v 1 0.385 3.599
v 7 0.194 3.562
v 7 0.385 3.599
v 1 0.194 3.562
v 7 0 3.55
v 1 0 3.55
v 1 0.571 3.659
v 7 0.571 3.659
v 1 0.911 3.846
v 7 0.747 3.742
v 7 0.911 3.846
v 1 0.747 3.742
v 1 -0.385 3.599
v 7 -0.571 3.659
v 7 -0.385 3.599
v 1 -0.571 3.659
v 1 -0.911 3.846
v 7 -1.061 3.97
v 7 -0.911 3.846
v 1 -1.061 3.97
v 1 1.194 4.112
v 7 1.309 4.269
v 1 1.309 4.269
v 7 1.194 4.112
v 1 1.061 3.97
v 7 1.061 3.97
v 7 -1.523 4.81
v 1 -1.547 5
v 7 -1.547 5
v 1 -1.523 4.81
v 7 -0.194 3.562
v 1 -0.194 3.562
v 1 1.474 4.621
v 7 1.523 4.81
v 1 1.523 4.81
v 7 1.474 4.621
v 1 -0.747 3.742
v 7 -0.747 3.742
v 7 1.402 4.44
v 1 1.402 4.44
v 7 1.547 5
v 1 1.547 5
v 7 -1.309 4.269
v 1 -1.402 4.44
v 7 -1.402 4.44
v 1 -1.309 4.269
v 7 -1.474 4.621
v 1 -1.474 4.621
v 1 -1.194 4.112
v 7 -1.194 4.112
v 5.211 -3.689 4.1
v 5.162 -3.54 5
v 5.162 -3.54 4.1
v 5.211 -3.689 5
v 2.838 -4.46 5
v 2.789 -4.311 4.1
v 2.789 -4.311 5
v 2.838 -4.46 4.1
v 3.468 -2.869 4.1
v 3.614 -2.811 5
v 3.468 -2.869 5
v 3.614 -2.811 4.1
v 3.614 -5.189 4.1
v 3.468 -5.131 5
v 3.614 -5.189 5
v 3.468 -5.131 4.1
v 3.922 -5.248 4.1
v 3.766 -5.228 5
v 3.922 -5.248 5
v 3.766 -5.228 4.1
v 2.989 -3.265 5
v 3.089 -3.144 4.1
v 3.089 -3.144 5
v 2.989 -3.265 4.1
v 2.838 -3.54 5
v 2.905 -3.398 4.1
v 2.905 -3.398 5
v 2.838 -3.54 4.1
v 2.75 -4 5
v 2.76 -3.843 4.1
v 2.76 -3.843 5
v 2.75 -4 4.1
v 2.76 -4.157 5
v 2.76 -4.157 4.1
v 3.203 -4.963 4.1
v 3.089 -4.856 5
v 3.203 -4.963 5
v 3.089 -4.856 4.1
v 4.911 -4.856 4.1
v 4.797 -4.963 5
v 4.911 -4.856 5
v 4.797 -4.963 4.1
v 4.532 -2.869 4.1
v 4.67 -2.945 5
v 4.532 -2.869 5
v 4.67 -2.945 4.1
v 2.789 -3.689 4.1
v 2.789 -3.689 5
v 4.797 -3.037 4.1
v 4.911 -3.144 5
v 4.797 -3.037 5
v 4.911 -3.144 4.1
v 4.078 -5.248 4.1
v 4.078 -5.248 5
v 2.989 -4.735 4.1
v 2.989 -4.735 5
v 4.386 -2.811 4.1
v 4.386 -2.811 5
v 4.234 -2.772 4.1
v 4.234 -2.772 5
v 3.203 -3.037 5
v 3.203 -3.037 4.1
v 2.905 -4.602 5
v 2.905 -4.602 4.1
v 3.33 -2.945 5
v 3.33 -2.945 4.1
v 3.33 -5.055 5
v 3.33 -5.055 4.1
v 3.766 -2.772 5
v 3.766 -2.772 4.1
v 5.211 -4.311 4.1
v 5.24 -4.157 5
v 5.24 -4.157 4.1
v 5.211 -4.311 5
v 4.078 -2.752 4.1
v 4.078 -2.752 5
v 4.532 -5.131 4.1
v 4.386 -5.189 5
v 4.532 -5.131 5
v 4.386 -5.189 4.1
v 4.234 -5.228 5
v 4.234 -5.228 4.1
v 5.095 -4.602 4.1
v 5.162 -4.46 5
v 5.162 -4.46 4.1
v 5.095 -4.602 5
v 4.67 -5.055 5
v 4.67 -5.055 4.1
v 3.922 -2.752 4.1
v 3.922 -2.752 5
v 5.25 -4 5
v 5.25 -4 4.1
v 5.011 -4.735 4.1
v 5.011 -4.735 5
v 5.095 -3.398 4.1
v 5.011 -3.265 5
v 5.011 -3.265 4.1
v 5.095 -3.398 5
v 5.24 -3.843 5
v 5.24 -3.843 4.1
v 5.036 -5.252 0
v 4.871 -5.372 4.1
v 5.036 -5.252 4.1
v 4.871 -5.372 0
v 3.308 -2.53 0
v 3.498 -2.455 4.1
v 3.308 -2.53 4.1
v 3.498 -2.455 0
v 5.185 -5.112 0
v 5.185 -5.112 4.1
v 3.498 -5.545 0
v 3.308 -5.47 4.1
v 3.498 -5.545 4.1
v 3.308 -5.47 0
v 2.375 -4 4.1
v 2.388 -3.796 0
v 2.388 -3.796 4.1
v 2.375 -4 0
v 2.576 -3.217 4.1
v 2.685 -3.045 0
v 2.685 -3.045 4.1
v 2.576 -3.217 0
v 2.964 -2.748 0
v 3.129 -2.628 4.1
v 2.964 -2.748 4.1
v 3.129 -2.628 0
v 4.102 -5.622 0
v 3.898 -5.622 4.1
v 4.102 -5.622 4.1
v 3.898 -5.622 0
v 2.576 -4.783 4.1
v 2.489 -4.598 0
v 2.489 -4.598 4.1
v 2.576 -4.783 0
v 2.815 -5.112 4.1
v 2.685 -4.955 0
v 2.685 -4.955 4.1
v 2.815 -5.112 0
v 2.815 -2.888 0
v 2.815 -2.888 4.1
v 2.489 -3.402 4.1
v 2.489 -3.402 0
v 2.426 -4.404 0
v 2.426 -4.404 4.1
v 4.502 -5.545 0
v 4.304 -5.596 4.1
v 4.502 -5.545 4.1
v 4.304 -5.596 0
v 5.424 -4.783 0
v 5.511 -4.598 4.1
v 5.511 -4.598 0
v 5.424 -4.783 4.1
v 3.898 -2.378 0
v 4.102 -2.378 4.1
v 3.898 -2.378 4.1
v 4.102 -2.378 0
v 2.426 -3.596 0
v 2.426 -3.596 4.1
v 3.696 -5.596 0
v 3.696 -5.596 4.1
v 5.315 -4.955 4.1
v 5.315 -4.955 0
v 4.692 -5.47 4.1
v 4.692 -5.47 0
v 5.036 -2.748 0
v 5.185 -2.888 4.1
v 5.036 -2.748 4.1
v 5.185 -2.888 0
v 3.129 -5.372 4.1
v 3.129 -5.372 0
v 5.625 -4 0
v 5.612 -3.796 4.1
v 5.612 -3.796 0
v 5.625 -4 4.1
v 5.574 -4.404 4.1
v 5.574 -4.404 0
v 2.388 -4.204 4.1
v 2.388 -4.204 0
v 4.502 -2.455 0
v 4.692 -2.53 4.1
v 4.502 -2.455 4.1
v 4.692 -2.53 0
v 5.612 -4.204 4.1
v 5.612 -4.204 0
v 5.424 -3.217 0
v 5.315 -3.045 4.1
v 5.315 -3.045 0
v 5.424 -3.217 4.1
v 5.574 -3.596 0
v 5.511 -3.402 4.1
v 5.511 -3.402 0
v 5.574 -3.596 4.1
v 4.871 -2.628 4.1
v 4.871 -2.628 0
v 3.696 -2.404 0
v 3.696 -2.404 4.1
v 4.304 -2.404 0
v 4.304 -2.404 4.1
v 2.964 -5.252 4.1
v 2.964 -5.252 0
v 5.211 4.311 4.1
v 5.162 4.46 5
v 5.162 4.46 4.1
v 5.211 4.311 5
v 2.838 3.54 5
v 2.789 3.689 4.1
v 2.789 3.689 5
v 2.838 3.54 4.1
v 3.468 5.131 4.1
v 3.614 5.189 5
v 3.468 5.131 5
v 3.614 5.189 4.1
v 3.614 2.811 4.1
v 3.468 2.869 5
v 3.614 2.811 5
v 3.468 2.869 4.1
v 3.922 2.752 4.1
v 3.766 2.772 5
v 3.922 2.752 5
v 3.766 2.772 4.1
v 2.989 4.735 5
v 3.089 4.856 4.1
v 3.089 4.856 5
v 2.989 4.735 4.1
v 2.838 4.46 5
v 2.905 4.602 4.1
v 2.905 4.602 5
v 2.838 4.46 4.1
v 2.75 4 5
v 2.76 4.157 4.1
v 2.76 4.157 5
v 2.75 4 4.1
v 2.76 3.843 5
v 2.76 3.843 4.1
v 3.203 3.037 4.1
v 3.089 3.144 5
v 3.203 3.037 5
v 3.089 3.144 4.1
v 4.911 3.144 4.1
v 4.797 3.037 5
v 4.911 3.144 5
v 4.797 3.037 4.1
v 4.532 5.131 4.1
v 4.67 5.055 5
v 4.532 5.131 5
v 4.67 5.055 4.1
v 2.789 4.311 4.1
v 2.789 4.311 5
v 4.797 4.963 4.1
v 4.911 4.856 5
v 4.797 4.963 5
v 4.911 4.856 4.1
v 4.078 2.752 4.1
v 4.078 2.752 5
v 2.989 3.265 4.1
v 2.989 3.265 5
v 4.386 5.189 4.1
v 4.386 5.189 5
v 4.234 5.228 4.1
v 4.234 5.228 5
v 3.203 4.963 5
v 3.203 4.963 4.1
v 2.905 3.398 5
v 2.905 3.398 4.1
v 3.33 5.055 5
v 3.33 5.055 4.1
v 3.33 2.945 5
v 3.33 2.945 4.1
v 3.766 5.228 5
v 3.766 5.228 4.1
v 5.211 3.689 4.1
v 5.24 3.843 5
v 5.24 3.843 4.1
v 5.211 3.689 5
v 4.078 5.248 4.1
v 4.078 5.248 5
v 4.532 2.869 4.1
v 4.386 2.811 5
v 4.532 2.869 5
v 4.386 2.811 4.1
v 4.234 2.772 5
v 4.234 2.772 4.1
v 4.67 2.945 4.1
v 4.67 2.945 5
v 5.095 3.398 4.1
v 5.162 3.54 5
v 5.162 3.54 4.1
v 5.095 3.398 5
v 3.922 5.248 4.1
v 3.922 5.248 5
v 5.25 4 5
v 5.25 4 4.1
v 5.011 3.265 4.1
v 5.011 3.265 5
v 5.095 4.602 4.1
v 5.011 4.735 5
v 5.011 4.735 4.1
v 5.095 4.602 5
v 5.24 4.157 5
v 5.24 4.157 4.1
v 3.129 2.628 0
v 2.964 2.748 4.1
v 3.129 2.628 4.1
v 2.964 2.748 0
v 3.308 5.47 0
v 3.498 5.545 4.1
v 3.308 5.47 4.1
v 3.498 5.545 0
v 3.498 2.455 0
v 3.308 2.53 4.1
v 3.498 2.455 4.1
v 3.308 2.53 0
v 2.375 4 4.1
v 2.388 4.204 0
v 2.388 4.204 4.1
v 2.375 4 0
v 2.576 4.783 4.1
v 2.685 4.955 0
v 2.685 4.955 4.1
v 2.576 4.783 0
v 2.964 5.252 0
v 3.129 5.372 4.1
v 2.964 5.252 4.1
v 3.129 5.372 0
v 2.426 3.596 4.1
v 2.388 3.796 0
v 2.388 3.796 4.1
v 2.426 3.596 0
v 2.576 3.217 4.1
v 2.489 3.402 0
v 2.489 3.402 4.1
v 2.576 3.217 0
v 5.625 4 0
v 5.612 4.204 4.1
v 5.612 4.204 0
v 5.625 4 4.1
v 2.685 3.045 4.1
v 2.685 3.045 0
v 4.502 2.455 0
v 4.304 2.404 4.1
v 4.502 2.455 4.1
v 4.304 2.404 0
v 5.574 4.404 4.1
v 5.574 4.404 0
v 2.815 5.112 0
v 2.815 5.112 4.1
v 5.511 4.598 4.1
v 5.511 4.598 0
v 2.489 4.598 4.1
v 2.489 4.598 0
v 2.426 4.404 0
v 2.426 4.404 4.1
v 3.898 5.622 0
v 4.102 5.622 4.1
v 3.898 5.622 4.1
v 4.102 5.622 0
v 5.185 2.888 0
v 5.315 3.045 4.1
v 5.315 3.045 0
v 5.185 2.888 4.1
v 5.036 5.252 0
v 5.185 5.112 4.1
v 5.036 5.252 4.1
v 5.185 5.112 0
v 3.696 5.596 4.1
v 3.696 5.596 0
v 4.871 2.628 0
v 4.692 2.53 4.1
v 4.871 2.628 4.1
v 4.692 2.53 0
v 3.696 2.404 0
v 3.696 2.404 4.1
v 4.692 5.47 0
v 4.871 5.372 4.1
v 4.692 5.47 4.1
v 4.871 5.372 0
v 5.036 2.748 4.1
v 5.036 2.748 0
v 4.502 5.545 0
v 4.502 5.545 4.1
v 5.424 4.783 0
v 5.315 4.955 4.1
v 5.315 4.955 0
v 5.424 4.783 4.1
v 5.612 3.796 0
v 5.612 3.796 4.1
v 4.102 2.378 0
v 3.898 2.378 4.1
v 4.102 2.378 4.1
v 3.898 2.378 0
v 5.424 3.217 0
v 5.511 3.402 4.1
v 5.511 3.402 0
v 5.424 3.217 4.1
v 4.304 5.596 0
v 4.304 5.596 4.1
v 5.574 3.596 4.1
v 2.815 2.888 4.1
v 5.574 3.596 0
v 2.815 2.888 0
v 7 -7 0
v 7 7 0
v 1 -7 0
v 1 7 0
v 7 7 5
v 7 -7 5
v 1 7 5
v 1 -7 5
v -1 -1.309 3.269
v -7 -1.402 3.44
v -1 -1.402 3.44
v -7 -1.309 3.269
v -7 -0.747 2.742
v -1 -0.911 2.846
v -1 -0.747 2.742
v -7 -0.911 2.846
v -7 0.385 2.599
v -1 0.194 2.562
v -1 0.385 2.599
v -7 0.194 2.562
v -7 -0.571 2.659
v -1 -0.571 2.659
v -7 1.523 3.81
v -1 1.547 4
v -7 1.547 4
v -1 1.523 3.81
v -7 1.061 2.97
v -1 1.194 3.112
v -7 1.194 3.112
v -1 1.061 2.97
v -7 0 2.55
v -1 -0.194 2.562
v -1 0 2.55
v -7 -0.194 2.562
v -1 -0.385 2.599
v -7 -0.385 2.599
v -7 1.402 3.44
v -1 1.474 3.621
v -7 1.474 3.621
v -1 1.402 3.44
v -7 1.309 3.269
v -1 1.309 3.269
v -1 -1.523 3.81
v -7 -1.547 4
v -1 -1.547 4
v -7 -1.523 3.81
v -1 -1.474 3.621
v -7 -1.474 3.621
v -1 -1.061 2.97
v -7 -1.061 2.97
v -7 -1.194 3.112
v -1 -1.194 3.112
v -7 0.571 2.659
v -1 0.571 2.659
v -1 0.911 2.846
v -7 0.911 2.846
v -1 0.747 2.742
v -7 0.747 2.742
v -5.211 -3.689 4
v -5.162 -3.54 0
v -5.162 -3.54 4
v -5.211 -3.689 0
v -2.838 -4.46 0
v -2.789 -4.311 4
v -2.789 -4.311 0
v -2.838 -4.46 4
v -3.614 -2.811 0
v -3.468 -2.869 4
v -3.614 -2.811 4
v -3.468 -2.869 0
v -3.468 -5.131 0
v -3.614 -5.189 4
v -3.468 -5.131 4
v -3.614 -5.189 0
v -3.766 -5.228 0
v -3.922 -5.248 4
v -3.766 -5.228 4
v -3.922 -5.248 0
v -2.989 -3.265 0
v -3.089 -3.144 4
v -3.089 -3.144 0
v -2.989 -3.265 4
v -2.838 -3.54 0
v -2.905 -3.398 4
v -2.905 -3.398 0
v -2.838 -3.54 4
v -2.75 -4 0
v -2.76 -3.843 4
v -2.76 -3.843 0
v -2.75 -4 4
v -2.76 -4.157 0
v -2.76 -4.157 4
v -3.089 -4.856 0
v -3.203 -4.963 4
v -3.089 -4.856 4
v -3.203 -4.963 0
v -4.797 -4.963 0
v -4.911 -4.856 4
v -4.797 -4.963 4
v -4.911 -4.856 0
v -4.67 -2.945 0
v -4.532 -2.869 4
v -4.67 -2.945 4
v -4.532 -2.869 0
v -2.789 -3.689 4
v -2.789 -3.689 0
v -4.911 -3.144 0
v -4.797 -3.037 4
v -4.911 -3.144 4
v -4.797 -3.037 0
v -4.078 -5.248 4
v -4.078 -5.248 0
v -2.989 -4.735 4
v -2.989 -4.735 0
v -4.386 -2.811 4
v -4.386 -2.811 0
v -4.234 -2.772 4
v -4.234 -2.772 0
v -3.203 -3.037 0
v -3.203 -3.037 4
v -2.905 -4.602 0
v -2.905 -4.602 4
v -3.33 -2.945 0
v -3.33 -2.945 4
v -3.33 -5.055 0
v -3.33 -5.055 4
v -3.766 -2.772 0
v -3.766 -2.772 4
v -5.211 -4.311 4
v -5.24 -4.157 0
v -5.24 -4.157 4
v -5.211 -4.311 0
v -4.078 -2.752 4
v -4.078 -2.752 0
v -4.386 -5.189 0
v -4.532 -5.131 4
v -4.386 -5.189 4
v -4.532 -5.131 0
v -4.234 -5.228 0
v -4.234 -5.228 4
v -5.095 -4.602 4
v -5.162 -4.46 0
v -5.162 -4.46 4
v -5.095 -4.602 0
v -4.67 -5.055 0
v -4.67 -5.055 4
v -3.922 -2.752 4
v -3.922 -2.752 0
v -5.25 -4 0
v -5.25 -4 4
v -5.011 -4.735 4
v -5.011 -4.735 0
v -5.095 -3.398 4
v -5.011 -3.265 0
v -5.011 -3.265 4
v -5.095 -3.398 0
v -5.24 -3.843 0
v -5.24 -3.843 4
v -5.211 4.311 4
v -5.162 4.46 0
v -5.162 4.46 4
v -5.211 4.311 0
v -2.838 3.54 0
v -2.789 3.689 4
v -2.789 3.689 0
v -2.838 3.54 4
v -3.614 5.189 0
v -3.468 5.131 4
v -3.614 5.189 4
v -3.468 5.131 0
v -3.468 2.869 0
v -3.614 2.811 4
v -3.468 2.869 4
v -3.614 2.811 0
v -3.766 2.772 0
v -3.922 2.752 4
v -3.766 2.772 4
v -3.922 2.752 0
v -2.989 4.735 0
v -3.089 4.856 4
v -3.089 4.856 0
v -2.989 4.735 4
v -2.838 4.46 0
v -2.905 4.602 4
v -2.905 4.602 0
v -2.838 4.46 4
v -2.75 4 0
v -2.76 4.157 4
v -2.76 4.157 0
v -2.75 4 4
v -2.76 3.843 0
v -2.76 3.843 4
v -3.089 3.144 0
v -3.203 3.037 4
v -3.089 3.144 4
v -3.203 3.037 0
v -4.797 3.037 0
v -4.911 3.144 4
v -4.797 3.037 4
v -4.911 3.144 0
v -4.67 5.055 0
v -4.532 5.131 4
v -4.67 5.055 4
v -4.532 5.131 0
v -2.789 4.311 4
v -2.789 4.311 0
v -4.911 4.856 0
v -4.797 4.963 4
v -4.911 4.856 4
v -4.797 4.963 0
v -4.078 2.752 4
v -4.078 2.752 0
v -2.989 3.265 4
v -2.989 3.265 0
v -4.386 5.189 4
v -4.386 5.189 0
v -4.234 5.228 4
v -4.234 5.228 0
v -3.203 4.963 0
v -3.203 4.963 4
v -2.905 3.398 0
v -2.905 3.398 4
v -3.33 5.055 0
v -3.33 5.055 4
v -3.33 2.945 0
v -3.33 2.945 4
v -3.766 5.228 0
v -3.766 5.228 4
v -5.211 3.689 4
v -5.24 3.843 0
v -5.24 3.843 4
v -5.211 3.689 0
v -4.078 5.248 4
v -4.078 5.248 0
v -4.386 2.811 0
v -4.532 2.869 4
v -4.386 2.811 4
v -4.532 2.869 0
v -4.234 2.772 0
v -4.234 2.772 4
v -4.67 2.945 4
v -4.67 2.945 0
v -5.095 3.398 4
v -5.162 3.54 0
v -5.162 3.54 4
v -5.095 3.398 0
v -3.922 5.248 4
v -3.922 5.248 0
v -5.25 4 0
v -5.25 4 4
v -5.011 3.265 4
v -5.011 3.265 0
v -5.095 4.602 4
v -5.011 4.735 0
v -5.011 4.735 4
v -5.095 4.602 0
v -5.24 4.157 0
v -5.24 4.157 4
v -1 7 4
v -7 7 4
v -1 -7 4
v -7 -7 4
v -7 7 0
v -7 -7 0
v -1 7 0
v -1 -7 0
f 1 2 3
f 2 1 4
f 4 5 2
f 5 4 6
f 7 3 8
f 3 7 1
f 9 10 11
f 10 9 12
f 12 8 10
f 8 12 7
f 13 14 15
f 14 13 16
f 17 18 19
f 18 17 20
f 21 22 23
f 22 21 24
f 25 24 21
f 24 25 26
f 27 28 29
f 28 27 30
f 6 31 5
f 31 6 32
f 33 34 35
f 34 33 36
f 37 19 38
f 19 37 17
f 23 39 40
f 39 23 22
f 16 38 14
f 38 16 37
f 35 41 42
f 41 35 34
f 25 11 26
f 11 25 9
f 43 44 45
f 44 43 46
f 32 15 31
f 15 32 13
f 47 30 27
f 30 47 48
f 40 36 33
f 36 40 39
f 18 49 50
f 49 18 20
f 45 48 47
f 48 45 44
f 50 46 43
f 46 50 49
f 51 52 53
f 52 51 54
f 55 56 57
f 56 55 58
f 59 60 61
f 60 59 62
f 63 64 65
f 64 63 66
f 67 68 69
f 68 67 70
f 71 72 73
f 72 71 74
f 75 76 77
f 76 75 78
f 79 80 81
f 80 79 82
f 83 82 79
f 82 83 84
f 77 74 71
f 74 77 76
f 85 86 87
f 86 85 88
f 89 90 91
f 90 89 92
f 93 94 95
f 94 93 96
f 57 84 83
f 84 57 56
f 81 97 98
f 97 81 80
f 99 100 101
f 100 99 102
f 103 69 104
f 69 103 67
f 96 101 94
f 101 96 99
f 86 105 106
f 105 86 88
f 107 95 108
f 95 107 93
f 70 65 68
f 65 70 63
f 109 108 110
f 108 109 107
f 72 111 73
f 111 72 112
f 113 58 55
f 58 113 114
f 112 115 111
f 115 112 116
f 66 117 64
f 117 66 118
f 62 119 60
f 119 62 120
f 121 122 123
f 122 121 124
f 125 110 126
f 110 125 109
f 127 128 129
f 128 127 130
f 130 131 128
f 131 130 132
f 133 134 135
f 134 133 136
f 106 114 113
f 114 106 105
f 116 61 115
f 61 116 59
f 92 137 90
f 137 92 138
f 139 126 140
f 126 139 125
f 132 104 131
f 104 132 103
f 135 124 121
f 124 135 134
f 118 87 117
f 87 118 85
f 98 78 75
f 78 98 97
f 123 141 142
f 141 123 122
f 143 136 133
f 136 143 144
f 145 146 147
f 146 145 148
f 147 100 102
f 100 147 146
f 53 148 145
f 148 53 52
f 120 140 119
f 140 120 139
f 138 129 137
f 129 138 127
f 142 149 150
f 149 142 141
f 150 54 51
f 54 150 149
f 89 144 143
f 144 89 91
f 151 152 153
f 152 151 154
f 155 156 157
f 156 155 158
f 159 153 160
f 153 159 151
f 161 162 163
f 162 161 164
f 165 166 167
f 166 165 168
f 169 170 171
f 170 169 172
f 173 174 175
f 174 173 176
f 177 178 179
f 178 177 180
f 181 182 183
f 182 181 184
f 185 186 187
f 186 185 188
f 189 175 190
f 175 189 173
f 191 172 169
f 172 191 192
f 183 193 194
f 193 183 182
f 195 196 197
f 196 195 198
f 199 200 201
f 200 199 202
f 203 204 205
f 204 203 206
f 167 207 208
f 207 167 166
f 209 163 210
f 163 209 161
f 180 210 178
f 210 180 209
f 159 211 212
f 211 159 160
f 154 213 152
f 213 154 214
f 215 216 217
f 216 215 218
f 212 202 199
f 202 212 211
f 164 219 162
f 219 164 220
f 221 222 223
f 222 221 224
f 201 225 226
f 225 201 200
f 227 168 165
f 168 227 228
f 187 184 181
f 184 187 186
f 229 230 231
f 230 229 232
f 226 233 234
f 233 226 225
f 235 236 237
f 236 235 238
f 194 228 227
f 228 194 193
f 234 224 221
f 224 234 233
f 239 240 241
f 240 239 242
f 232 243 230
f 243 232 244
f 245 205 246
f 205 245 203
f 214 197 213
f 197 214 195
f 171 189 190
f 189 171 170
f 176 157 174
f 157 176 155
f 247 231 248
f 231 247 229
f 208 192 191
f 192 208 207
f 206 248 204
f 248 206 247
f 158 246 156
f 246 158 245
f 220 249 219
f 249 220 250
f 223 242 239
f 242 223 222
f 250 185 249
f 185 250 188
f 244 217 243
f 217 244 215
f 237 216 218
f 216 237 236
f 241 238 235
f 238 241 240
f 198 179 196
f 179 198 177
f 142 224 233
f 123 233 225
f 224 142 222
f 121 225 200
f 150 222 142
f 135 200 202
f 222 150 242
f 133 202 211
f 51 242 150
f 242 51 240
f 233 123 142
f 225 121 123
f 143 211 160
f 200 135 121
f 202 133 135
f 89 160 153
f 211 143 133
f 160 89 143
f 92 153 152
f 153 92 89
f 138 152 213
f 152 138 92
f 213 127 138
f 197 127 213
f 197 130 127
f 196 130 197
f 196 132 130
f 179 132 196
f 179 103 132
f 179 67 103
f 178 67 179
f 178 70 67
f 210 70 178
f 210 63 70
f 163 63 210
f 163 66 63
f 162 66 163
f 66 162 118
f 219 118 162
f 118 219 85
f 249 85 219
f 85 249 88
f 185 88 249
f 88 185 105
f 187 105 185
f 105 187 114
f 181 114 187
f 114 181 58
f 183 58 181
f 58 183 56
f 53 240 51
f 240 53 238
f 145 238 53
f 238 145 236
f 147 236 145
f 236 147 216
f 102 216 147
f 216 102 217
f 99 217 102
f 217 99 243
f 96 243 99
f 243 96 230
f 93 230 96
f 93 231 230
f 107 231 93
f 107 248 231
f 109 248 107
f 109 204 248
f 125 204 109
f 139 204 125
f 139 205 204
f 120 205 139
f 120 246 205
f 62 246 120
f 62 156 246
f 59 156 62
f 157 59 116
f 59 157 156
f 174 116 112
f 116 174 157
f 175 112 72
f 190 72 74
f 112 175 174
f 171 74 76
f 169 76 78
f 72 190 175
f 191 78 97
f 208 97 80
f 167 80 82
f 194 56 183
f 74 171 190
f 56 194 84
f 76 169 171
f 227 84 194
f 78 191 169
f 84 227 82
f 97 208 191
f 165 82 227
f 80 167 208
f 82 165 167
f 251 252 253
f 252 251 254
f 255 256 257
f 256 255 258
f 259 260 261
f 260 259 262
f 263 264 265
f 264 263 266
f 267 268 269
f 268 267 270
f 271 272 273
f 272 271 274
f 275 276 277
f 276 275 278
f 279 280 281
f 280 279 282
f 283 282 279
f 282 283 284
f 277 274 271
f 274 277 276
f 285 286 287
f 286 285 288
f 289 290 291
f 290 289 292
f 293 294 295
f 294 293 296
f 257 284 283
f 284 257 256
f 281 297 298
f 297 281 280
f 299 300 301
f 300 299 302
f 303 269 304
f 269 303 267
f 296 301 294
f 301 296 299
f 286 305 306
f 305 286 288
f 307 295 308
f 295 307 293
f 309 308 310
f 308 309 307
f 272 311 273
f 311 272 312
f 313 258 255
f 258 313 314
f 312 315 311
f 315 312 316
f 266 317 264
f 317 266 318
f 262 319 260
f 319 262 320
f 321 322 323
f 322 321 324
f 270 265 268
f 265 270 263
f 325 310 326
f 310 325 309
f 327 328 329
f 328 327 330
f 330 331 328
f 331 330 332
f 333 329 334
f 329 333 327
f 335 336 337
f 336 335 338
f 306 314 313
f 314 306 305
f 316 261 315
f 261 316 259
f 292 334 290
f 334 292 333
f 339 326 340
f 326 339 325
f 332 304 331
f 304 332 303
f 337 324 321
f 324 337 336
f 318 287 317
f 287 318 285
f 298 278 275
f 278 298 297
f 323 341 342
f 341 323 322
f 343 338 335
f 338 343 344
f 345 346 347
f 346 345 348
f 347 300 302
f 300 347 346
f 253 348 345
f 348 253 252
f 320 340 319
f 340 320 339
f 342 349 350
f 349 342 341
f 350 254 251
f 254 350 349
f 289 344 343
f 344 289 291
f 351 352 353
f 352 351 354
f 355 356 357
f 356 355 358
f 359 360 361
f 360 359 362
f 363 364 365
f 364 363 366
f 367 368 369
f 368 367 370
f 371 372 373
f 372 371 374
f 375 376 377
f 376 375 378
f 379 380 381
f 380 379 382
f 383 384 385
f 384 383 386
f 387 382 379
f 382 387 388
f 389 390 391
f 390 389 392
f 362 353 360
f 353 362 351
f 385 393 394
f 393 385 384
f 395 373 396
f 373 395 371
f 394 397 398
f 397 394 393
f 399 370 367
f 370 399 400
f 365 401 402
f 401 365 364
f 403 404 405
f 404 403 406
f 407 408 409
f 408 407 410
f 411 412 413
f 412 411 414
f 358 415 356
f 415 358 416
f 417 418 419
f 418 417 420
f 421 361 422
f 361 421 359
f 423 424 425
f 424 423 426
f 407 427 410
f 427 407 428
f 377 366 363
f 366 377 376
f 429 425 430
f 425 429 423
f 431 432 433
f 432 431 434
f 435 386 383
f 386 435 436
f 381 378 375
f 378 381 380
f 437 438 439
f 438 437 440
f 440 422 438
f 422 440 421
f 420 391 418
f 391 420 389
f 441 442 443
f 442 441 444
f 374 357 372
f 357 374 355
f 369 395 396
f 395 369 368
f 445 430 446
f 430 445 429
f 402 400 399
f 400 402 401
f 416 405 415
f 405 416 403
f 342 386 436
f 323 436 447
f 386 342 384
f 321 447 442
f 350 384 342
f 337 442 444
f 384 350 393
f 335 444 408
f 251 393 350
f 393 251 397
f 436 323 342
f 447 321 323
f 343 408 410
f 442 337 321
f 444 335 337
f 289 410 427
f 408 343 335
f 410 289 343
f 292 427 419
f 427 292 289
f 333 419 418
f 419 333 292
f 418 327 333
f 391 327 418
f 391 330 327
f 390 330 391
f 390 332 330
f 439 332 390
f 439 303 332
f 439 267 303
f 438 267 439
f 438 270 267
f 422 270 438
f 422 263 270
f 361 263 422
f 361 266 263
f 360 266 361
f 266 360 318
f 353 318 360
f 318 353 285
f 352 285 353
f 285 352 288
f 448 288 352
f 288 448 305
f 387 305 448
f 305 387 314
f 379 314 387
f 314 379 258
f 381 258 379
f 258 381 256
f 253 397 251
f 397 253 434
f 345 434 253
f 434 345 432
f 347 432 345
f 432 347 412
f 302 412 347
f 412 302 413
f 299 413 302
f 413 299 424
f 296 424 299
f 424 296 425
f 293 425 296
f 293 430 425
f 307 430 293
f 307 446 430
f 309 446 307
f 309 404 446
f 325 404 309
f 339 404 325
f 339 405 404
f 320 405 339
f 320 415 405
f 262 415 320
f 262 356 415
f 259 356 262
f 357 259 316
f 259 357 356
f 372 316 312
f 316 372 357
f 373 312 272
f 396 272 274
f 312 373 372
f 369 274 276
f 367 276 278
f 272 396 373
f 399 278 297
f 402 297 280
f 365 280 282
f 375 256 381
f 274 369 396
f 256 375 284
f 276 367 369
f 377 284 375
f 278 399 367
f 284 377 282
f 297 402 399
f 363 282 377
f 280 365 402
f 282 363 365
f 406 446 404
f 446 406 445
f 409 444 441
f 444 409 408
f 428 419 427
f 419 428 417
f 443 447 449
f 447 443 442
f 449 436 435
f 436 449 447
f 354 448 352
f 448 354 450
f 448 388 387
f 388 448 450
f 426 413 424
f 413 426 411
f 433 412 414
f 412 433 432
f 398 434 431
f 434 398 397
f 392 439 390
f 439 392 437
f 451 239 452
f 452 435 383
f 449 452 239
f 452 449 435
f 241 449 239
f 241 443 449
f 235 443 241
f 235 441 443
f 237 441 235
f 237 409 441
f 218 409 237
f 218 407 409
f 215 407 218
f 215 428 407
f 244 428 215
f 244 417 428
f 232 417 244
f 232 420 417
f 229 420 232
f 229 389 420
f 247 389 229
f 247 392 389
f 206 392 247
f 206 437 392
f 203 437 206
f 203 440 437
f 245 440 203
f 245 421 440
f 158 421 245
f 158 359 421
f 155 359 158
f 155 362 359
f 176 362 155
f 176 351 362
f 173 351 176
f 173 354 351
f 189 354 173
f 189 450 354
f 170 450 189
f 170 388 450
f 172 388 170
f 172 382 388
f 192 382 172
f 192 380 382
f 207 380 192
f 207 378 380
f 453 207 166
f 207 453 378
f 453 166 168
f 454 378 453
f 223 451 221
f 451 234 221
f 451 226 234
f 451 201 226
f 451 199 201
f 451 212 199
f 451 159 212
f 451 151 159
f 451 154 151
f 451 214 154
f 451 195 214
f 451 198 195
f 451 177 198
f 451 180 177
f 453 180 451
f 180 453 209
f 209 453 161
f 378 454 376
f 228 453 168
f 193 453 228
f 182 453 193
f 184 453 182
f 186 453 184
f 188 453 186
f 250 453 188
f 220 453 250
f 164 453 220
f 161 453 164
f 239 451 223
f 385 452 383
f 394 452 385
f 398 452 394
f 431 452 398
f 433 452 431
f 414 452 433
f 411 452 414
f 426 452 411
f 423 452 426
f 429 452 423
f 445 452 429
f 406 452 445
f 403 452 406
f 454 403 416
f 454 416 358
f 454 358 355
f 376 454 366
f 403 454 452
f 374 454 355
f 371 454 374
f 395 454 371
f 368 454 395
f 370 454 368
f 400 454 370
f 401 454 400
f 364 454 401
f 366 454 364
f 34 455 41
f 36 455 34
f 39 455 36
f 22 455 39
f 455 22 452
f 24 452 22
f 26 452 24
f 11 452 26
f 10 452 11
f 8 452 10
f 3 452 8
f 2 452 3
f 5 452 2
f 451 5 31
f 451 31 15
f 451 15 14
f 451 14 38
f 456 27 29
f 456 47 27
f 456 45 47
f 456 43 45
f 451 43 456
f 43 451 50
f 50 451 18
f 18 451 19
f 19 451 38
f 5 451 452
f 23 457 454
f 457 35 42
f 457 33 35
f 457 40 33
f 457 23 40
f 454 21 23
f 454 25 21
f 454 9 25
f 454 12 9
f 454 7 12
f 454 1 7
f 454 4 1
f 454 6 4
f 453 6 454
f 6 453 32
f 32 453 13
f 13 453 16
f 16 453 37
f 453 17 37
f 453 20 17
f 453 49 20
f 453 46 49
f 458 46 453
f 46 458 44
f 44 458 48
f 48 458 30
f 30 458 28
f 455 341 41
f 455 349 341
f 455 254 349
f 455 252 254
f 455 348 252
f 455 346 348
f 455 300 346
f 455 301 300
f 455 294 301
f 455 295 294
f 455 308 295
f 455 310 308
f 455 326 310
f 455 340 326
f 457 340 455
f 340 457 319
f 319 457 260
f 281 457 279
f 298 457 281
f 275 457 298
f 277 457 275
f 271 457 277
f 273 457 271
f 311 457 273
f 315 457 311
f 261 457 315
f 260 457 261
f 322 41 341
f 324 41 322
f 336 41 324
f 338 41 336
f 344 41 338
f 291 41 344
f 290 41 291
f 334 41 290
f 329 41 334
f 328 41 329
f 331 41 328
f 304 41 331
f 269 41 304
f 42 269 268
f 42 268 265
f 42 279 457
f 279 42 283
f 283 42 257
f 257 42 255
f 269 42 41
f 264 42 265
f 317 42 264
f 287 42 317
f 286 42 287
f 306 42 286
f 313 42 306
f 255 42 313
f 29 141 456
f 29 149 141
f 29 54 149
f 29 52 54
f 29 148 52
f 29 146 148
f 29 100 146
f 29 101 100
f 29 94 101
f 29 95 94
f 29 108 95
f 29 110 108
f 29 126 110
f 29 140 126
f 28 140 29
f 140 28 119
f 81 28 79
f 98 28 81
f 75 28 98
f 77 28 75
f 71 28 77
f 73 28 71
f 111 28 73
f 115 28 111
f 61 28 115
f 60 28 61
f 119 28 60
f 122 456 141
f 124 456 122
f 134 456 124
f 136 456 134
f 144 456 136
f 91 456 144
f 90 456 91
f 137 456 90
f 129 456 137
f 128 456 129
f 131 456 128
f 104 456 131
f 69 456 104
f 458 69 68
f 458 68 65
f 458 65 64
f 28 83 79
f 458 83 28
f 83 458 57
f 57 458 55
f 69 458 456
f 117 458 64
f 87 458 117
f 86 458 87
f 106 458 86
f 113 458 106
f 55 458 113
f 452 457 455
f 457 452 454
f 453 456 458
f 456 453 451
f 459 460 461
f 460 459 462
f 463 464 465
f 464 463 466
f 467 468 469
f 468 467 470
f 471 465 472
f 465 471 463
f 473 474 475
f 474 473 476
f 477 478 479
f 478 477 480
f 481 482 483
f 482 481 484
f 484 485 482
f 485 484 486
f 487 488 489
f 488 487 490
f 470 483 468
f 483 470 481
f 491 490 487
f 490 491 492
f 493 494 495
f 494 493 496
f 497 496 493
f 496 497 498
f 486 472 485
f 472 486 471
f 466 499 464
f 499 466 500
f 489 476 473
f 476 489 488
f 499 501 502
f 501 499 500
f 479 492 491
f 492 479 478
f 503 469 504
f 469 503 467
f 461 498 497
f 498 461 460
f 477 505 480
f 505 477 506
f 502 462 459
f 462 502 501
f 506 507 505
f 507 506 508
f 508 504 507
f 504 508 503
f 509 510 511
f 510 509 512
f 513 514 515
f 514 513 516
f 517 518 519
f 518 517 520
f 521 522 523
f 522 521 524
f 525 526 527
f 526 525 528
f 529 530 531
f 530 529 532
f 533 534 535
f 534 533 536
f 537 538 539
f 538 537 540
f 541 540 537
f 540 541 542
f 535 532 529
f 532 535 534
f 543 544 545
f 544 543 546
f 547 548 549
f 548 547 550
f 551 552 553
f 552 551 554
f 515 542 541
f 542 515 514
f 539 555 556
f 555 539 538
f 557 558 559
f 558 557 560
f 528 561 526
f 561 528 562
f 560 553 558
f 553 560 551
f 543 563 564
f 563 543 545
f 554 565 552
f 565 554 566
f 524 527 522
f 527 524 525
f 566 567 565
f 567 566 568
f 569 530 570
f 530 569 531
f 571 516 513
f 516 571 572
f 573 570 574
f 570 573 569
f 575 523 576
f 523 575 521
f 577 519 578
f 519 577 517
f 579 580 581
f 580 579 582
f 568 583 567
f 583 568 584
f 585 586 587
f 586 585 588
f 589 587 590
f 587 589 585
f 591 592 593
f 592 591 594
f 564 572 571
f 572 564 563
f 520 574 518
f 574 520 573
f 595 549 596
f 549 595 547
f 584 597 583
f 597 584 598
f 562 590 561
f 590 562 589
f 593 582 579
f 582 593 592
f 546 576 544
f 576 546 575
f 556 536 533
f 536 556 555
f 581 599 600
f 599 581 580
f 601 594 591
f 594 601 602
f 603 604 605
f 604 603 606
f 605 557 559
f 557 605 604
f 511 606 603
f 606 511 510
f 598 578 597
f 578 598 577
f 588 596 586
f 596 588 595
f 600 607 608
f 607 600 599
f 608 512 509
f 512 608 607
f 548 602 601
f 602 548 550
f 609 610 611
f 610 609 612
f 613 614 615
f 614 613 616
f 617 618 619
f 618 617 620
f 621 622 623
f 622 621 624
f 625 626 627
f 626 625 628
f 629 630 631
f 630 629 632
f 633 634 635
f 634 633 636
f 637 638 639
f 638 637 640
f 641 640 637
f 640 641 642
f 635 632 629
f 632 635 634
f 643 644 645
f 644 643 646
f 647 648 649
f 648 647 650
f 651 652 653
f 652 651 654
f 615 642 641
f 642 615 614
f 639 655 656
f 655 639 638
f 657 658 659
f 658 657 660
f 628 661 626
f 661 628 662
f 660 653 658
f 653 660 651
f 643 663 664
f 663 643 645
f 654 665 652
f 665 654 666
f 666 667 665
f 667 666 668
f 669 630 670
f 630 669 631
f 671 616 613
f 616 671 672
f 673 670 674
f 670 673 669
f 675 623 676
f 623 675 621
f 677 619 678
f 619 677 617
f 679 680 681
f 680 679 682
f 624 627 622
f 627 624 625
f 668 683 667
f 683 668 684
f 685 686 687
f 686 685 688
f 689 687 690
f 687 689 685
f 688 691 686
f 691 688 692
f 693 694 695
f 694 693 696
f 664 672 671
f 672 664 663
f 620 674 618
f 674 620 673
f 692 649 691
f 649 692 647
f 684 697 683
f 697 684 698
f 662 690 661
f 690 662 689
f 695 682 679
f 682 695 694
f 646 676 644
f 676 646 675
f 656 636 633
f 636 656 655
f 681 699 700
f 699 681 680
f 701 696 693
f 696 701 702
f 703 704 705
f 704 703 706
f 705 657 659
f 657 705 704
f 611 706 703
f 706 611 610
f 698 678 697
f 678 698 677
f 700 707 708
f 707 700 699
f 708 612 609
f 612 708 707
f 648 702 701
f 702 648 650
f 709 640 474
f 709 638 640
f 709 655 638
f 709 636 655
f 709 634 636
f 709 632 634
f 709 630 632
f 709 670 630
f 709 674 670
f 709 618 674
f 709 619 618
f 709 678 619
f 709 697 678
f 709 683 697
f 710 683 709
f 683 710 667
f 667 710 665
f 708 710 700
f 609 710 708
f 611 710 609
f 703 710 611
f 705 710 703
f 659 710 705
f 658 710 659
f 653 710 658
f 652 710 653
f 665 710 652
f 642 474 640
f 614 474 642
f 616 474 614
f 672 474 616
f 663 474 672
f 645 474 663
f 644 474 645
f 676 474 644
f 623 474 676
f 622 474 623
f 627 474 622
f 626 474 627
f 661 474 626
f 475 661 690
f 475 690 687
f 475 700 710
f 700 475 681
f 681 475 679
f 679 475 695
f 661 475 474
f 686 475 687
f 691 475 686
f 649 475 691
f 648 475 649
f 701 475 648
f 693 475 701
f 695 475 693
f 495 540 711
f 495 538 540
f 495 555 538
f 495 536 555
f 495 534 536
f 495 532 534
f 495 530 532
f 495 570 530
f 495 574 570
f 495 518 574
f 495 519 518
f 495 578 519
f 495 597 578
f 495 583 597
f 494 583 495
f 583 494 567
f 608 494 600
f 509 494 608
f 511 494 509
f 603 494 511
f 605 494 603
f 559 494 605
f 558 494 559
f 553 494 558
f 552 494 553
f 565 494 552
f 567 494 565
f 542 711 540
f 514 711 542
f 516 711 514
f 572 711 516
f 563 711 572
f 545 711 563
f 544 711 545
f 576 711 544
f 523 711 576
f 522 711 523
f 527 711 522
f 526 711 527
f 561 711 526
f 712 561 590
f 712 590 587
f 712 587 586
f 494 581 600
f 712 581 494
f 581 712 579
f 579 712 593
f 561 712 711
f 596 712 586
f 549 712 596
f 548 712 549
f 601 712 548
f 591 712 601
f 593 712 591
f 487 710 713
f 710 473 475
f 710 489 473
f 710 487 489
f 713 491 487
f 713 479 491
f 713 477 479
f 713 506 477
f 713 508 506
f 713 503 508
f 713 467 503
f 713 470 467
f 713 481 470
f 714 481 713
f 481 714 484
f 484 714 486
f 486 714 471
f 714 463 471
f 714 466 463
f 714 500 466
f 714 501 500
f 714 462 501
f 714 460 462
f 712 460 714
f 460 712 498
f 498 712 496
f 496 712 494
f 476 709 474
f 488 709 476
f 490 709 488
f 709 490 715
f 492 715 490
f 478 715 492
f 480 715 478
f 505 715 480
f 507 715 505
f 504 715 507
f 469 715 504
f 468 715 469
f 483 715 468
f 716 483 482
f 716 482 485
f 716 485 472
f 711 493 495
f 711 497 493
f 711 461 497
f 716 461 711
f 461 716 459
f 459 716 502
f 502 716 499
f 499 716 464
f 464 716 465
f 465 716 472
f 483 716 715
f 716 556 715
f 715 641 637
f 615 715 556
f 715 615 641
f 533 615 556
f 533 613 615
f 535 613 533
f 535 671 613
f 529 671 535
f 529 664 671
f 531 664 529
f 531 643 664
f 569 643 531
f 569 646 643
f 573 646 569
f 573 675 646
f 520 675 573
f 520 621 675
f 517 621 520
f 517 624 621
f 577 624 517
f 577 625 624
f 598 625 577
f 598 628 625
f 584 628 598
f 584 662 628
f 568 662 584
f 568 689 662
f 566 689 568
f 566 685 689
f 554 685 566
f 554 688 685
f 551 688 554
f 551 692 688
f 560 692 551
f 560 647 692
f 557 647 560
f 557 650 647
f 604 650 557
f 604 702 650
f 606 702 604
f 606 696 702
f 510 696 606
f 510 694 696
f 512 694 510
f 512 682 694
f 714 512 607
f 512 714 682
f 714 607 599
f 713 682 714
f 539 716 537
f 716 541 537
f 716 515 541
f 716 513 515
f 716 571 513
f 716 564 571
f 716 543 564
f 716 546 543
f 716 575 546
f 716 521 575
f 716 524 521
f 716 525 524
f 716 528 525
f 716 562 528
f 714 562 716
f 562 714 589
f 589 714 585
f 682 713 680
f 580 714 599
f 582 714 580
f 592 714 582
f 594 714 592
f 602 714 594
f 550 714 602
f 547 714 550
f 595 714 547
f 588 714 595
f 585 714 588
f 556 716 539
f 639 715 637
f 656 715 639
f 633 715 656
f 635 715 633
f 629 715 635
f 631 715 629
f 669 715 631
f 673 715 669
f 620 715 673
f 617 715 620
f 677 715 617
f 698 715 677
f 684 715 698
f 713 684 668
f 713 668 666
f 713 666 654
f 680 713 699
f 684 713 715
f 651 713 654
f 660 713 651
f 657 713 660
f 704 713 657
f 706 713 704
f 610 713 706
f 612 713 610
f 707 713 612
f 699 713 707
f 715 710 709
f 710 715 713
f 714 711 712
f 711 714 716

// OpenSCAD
$fn=50;

// 4mm tall, 14mm wide
// 3.25mm cylindrical post to go around.

translate([1,0,5.1]) rotate([0,90,0]) difference() {
   translate([0.1,-7,0]) cube([5,14,6]);
   cutouts();
}
translate([-1,0,4.1]) rotate([0,-90,0]) difference() {
   translate([-4.1,-7,0]) cube([4,14,6]);
   cutouts();
}

module cutouts() {
   // translate([0,0,-0.1]) cylinder(d=3.4,h=10);
   translate([0,0,-0.1]) cylinder(d=3.1,h=10);
   translate([-10,-4,3]) rotate([0,90,0]) cylinder(d=2.5,h=20);
   translate([1,-4,3]) rotate([0,90,0]) cylinder(d=3.25,h=10);
   translate([-10,4,3]) rotate([0,90,0]) cylinder(d=2.5,h=20);
   translate([1,4,3]) rotate([0,90,0]) cylinder(d=3.25,h=10);
}
